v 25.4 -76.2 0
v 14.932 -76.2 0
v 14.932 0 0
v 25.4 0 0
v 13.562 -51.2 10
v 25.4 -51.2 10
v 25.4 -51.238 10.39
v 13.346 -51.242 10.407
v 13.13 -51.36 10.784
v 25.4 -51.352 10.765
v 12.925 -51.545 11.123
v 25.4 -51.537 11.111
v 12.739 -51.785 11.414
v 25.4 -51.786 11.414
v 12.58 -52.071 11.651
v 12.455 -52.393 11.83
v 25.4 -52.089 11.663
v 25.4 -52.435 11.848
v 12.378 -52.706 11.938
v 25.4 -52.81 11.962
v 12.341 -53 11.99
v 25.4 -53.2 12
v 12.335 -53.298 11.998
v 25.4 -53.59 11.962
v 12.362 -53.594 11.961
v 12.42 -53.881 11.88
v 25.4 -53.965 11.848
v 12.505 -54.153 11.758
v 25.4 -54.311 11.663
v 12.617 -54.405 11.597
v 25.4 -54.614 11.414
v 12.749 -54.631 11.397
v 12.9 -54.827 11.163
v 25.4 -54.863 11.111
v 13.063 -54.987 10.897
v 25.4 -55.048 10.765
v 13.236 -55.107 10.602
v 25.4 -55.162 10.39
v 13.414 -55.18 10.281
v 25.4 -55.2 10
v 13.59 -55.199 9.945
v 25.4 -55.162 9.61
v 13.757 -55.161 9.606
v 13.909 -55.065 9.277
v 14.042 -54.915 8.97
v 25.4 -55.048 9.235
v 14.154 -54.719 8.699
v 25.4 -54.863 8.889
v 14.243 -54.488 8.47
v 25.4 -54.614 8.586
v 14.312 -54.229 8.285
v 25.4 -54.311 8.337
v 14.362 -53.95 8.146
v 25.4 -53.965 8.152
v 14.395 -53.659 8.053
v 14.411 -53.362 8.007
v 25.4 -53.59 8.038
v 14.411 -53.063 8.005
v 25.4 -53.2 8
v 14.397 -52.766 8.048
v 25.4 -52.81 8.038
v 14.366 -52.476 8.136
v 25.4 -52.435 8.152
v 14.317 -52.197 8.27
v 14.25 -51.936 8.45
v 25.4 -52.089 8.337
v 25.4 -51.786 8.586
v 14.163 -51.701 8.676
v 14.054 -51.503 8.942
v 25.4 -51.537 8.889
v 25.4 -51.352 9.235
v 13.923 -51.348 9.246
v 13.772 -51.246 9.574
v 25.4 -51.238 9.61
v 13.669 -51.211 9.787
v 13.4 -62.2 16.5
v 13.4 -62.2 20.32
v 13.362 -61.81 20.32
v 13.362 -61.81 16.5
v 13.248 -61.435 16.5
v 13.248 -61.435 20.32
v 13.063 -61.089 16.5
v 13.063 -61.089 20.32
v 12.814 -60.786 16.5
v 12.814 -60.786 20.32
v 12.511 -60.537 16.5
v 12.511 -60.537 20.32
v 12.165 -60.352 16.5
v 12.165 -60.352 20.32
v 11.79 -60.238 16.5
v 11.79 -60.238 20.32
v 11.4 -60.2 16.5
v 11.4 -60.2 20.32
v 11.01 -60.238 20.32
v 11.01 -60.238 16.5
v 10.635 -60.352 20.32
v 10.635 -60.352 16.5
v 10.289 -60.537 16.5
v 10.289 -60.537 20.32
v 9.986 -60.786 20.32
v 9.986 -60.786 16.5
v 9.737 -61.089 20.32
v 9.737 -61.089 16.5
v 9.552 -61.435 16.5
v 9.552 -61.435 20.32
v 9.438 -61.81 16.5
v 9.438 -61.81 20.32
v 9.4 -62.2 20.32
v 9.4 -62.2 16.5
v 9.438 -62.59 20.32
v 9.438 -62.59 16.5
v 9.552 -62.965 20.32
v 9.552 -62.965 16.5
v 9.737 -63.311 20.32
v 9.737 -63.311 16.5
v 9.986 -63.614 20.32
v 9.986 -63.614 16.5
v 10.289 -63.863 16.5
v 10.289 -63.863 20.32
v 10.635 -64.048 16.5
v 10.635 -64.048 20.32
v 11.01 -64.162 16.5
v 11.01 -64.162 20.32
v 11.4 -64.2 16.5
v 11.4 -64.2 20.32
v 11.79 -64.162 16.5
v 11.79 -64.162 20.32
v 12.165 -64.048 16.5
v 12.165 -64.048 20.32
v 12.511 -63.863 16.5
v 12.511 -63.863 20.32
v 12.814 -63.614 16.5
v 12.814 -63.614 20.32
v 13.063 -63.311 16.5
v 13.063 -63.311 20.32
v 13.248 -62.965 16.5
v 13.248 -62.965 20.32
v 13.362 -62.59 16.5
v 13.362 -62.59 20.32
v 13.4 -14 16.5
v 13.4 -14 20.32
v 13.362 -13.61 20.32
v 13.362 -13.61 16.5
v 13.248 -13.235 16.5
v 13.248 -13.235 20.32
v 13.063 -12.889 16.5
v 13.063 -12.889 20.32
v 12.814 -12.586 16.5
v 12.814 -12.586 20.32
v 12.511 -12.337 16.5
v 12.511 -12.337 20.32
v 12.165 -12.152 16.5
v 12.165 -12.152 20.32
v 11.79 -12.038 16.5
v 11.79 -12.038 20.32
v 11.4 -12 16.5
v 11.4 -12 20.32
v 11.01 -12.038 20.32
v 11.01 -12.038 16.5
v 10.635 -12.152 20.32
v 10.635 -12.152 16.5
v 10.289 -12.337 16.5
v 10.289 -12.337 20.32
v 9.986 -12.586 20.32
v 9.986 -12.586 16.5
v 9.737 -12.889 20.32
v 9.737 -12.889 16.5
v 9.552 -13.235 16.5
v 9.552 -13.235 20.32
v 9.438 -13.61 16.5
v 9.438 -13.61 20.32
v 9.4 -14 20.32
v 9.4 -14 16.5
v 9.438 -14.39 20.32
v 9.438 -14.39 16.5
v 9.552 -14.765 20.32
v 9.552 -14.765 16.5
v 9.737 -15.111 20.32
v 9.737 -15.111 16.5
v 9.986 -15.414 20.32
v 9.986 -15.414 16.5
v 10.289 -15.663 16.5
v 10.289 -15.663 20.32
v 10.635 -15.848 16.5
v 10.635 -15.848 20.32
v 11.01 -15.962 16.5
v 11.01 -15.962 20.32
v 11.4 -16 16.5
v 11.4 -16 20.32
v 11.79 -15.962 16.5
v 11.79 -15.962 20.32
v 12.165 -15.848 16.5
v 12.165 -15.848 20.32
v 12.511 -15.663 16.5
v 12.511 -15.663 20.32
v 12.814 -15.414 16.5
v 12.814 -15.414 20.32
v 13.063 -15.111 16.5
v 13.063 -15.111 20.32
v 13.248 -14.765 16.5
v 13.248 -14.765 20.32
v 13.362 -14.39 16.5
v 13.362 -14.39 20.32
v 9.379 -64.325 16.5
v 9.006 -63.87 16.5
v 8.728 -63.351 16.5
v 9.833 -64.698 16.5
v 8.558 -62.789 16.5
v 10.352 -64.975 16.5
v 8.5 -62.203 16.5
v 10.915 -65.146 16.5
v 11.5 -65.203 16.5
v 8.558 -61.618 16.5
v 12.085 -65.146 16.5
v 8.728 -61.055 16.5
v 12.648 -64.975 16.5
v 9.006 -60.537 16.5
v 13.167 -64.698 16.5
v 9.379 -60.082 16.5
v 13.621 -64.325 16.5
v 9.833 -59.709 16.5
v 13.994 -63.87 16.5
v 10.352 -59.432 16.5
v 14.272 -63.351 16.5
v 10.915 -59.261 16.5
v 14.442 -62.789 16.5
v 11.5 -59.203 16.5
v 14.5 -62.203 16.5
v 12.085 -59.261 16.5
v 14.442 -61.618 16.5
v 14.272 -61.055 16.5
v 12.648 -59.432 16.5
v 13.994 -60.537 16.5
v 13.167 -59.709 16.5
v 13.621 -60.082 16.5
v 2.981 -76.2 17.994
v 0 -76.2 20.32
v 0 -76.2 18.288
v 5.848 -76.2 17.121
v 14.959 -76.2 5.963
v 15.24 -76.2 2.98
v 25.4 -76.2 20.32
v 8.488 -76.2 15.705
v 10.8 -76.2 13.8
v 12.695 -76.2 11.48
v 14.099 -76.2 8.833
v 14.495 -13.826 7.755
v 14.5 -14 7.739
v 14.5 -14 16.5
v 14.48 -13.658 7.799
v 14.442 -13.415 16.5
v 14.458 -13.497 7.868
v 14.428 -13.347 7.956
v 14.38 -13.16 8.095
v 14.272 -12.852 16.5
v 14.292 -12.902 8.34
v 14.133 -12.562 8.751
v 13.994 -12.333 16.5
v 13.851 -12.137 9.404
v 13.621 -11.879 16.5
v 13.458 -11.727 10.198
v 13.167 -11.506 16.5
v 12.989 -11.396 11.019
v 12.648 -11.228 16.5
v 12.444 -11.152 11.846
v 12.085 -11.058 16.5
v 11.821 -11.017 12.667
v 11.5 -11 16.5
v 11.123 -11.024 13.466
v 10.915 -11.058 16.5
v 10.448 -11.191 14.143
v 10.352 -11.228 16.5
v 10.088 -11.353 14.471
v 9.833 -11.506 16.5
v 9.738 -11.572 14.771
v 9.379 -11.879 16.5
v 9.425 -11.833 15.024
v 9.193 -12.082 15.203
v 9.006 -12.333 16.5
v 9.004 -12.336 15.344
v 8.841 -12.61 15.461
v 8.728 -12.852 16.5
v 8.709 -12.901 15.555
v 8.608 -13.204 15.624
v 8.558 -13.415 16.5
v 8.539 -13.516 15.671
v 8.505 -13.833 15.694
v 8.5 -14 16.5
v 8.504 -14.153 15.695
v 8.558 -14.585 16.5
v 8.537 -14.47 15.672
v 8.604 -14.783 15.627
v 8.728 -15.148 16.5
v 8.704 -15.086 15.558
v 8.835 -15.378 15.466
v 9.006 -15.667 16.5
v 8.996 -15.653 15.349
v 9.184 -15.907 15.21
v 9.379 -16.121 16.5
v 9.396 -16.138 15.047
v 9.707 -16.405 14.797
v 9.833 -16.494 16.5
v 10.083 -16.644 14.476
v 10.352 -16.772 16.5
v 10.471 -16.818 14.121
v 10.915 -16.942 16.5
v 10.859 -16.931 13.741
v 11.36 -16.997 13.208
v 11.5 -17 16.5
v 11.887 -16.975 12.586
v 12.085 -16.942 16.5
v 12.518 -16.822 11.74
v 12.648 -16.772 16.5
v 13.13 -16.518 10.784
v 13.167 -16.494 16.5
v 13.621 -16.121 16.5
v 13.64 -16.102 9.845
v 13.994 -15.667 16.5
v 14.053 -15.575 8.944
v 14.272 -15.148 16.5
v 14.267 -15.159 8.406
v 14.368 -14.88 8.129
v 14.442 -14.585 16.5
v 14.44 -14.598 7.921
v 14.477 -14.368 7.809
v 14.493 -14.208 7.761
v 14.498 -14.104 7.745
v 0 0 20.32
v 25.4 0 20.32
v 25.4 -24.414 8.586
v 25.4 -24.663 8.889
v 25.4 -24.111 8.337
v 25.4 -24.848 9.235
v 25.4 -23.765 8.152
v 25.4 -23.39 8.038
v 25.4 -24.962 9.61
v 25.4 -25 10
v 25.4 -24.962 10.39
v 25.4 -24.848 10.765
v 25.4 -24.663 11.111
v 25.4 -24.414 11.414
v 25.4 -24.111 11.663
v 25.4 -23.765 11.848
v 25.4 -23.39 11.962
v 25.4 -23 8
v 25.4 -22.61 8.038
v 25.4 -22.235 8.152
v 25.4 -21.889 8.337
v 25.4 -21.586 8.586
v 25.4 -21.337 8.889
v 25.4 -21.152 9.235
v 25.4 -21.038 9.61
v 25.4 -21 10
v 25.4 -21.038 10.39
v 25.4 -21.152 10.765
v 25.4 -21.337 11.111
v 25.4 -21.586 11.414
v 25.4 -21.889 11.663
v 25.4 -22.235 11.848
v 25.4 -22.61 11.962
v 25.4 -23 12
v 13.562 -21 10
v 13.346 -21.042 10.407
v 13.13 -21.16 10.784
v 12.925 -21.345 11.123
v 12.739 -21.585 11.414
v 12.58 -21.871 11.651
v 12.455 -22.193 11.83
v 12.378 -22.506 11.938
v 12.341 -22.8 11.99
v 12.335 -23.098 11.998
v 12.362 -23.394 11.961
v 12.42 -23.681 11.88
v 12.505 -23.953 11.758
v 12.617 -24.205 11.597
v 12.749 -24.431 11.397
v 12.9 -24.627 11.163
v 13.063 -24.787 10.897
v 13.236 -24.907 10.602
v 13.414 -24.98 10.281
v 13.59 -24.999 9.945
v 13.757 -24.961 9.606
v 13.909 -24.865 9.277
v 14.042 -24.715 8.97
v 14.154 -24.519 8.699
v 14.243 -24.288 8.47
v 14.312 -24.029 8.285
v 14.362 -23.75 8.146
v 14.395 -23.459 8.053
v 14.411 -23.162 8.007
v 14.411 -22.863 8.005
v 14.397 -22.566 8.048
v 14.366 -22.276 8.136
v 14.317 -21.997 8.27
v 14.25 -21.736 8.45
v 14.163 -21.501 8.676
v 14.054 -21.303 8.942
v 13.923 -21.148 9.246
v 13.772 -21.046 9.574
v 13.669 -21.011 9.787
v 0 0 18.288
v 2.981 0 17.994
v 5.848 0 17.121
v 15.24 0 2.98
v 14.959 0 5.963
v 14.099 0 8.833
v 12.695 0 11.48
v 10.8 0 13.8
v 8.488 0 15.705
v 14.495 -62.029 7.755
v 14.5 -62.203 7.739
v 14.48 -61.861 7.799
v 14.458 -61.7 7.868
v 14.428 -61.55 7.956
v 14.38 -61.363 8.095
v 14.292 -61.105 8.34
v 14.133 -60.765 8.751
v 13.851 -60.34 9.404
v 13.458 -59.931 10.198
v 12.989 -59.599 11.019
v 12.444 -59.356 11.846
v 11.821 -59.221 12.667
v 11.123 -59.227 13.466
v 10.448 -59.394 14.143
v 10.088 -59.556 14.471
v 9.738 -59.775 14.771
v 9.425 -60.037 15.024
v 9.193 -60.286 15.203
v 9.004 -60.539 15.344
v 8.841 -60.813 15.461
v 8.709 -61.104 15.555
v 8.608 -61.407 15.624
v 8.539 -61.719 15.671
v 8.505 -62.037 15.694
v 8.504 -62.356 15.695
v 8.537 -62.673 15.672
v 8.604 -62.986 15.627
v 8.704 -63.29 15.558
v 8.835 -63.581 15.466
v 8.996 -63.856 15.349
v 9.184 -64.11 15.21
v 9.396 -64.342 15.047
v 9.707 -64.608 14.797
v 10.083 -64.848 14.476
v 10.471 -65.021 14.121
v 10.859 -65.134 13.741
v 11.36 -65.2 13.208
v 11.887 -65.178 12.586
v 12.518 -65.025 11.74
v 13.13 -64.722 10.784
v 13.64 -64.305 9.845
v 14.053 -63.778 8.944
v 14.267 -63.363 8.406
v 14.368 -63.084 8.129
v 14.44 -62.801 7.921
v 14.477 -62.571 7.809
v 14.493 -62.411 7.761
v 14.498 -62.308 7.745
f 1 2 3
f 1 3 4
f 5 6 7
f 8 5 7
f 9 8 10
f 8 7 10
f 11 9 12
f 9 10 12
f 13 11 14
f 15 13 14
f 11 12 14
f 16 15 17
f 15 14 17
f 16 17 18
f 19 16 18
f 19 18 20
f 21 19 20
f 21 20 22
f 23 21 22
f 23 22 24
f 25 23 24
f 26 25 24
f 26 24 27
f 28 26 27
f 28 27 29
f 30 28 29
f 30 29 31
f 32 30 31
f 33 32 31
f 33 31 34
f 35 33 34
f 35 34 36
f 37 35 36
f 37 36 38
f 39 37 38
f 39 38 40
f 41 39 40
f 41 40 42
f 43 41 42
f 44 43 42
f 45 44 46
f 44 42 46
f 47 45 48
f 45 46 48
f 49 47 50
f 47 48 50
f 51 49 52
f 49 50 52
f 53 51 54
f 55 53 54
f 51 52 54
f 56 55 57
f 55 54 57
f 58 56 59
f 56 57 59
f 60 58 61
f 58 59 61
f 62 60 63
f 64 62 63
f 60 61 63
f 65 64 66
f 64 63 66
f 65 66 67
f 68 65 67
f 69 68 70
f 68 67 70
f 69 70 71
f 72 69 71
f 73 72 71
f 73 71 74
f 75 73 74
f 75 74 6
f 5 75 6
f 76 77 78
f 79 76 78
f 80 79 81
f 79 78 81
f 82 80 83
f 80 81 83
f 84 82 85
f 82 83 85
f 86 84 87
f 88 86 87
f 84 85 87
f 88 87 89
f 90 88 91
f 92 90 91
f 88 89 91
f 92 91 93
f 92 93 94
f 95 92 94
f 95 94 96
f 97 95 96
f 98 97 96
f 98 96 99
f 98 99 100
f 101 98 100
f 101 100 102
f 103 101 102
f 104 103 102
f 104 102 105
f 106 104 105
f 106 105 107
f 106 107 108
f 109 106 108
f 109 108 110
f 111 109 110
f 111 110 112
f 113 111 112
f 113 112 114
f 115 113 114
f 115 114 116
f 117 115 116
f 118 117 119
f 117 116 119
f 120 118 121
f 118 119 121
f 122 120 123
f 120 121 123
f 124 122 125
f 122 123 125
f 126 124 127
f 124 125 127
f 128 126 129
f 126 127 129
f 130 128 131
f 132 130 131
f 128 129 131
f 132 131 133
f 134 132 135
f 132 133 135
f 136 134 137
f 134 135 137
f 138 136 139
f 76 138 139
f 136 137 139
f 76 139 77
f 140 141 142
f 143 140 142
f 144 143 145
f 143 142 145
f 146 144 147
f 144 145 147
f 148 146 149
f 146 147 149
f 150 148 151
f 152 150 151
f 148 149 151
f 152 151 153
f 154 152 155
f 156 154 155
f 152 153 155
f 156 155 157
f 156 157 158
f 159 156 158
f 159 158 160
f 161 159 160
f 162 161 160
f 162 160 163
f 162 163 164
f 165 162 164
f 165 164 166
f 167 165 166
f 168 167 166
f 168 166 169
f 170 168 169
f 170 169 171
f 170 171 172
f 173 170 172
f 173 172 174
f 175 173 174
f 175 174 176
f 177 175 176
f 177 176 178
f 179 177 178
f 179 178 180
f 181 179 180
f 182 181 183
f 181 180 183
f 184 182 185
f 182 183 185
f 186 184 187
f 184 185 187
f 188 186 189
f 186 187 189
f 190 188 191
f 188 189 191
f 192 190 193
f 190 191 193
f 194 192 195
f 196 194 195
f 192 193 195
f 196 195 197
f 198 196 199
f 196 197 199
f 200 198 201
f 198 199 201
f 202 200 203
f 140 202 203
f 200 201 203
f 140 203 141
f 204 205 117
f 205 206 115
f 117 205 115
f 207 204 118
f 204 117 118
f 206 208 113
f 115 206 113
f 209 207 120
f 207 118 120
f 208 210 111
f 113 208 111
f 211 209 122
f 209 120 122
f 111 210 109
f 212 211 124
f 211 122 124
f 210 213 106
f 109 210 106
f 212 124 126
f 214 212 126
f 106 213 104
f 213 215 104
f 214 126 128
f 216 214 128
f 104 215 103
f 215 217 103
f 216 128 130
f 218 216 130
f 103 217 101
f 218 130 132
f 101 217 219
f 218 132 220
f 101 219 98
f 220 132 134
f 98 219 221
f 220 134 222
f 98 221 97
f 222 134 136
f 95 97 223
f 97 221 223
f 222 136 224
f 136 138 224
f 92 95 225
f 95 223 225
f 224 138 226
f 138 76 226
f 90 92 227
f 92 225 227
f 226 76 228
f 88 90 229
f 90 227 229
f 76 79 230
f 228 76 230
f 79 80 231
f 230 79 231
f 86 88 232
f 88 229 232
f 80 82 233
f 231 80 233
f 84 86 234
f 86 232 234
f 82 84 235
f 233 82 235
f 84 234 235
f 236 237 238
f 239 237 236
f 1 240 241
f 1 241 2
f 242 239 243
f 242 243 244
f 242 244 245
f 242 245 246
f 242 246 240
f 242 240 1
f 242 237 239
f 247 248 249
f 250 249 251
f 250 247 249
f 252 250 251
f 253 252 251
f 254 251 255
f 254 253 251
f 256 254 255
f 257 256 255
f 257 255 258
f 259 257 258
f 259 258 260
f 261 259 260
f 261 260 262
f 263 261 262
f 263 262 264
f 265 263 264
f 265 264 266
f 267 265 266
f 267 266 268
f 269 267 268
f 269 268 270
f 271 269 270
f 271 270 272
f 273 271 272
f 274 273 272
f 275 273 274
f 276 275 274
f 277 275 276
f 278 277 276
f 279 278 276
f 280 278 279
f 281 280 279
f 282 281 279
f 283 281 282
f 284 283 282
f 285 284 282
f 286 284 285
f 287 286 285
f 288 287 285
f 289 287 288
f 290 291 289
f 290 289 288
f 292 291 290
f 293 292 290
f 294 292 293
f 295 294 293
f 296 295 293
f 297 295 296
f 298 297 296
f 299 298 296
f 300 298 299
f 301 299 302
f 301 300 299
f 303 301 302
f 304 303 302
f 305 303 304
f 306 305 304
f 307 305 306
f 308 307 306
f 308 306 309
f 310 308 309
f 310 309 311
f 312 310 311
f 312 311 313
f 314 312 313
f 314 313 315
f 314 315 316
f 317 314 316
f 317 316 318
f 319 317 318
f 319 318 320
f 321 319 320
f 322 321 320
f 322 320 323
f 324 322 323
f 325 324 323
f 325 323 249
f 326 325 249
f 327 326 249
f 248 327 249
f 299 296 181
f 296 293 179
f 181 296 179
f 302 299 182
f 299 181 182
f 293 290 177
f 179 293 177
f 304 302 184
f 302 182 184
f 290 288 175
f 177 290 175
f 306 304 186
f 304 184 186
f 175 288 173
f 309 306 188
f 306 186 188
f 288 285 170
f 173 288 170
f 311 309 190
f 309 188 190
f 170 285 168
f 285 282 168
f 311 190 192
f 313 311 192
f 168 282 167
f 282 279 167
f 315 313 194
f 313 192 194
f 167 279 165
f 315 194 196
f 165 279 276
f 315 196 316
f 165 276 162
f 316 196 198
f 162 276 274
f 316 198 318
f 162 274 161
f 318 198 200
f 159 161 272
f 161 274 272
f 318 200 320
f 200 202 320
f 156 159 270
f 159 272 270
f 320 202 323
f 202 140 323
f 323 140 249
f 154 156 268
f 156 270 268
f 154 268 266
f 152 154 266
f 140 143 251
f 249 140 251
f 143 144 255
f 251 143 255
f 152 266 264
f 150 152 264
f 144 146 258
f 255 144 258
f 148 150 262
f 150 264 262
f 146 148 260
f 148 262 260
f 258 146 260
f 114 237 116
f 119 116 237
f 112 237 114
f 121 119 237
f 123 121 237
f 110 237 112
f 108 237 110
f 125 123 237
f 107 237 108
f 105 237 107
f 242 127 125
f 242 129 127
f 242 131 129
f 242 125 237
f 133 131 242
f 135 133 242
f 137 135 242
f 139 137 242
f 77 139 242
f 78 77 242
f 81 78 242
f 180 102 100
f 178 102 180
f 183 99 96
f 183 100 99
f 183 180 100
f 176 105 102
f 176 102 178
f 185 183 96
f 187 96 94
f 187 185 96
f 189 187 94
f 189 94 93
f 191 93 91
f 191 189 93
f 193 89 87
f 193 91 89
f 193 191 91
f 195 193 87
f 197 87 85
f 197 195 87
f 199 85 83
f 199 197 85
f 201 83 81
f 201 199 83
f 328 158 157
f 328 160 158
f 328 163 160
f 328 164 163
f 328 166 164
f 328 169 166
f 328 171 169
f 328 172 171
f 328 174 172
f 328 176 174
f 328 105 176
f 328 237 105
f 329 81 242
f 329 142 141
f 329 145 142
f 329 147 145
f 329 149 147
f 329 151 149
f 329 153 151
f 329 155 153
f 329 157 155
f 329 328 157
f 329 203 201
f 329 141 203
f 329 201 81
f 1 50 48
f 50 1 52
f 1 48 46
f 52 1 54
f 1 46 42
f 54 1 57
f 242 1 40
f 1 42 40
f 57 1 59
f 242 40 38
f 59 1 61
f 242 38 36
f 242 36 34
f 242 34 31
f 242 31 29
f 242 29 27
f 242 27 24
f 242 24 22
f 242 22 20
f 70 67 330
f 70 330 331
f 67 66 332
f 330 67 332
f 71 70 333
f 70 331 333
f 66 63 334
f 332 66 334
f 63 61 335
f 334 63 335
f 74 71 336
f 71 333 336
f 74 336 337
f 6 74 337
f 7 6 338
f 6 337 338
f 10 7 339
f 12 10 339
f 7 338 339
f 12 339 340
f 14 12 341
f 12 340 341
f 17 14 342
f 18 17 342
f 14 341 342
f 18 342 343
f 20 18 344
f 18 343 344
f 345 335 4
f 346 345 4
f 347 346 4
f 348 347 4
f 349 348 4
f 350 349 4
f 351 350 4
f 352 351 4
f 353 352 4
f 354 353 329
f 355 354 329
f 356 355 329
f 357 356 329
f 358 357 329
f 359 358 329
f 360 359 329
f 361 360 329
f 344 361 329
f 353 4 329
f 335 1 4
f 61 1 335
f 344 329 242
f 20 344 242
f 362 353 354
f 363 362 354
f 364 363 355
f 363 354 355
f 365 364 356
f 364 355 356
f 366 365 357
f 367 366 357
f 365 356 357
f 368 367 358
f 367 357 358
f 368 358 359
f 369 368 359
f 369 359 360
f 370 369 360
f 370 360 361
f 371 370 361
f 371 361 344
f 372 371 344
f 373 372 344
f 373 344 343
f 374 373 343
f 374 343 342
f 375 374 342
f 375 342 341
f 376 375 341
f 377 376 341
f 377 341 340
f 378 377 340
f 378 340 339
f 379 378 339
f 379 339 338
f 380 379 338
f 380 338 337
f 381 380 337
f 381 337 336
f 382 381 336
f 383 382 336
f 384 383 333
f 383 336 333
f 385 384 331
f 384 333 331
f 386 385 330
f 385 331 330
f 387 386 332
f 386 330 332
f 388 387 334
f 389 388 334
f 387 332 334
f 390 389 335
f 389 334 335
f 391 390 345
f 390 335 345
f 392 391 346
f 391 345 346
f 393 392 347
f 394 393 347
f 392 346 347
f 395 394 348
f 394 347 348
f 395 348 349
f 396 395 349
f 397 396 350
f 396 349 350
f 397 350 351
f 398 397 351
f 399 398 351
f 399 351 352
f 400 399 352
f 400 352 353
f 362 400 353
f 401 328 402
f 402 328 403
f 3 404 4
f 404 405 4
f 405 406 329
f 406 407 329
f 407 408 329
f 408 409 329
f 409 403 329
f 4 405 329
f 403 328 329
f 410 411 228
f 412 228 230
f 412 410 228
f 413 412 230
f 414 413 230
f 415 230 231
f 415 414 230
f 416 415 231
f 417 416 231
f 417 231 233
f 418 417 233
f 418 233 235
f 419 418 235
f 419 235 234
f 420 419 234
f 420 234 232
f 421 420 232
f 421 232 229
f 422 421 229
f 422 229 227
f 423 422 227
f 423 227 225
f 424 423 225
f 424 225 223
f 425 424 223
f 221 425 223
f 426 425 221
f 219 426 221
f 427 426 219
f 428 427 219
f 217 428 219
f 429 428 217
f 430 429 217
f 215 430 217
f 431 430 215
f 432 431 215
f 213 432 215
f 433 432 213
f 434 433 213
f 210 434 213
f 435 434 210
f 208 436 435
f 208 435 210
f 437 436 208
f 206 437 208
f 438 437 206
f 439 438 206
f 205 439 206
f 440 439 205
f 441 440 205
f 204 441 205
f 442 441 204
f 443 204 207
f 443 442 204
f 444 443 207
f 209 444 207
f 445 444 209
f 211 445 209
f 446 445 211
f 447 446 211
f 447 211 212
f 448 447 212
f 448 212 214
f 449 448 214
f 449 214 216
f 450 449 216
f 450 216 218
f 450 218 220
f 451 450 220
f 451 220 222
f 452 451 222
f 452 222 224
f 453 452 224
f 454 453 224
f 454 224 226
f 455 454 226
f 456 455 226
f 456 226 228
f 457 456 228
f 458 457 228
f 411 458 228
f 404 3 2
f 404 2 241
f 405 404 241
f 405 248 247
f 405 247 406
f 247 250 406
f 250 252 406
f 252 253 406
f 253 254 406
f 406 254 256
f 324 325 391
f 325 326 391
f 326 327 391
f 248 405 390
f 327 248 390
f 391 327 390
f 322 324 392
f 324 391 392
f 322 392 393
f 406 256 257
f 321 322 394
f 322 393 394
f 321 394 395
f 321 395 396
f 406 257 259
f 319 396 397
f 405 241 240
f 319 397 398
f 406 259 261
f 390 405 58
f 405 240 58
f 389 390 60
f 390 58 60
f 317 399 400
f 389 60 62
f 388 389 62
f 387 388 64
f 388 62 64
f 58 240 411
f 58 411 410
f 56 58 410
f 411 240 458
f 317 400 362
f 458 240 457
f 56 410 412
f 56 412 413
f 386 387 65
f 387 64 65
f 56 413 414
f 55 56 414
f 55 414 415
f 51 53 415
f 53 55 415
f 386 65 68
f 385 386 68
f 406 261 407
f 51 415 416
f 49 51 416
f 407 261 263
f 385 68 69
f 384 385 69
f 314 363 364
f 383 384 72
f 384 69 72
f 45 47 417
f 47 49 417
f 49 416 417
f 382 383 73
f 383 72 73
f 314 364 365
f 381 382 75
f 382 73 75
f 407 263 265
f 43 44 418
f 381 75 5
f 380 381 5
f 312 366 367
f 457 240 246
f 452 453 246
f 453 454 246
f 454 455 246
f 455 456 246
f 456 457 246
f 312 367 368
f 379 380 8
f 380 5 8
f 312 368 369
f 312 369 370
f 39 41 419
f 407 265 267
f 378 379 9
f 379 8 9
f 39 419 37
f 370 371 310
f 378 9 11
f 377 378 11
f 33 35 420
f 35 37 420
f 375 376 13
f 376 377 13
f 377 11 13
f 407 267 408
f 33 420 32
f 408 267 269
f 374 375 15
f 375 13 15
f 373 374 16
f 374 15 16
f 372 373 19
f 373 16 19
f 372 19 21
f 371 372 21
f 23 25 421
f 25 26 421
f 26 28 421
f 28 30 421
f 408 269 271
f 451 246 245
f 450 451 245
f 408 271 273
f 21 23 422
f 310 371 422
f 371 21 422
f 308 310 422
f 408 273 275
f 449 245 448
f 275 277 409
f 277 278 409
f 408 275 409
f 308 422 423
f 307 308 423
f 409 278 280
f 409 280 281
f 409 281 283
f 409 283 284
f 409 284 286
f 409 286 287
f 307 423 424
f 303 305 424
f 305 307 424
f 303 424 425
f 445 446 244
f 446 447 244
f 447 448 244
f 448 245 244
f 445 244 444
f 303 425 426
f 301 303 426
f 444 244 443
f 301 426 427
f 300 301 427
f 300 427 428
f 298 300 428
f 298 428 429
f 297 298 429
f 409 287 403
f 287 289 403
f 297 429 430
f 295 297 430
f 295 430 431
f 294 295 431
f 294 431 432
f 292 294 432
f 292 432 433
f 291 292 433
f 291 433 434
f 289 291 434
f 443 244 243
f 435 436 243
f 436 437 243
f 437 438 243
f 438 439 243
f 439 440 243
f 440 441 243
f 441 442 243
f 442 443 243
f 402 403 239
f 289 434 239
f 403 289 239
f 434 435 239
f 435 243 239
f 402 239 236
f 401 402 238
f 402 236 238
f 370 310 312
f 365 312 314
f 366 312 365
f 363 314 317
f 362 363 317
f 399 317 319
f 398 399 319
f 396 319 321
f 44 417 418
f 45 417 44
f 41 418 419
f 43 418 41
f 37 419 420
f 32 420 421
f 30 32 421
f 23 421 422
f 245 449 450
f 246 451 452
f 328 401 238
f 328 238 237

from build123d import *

# Parameters (mm, degrees)
F0_W     = 25.4
F0_H     = 20.32
F1_DEPTH = 76.2
F2_R     = 15.24
F3_DEPTH = 76.2
F4_R     = 2
F5_DEPTH = 25
F6_R     = 3
F7_DEPTH = 16.5
F8_R     = 2
F9_DEPTH = 25


with BuildPart() as f1:
    # F0 (on Front) → F1 (new body)
    with BuildSketch(Plane.XZ):
        with Locations((12.7, 10.16)):
            Rectangle(F0_W, F0_H)
    extrude(amount=F1_DEPTH)

    # F2 (on face) → F3 (cut)
    with BuildSketch(Plane.XZ.offset(76.2)):
        with Locations((0, 3.048)):
            Circle(F2_R)
    extrude(amount=-F3_DEPTH, mode=Mode.SUBTRACT)

    # F4 (on face) → F5 (cut)
    with BuildSketch(Plane.XY.offset(20.32)):
        with Locations((11.4, -14)):
            Circle(F4_R)
        with Locations((11.4, -62.2)):
            Circle(F4_R)
    extrude(amount=-F5_DEPTH, mode=Mode.SUBTRACT)

    # F6 (on Top) → F7 (cut)
    with BuildSketch(Plane.XY):
        with Locations((11.5, -14)):
            Circle(F6_R)
        with Locations((11.5, -62.20332)):
            Circle(F6_R)
    extrude(amount=F7_DEPTH, mode=Mode.SUBTRACT)

    # F8 (on face) → F9 (cut)
    with BuildSketch(Plane.YZ.offset(25.4)):
        with Locations((-23, 10)):
            Circle(F8_R)
        with Locations((-53.2, 10)):
            Circle(F8_R)
    extrude(amount=-F9_DEPTH, mode=Mode.SUBTRACT)


solid = f1.part
